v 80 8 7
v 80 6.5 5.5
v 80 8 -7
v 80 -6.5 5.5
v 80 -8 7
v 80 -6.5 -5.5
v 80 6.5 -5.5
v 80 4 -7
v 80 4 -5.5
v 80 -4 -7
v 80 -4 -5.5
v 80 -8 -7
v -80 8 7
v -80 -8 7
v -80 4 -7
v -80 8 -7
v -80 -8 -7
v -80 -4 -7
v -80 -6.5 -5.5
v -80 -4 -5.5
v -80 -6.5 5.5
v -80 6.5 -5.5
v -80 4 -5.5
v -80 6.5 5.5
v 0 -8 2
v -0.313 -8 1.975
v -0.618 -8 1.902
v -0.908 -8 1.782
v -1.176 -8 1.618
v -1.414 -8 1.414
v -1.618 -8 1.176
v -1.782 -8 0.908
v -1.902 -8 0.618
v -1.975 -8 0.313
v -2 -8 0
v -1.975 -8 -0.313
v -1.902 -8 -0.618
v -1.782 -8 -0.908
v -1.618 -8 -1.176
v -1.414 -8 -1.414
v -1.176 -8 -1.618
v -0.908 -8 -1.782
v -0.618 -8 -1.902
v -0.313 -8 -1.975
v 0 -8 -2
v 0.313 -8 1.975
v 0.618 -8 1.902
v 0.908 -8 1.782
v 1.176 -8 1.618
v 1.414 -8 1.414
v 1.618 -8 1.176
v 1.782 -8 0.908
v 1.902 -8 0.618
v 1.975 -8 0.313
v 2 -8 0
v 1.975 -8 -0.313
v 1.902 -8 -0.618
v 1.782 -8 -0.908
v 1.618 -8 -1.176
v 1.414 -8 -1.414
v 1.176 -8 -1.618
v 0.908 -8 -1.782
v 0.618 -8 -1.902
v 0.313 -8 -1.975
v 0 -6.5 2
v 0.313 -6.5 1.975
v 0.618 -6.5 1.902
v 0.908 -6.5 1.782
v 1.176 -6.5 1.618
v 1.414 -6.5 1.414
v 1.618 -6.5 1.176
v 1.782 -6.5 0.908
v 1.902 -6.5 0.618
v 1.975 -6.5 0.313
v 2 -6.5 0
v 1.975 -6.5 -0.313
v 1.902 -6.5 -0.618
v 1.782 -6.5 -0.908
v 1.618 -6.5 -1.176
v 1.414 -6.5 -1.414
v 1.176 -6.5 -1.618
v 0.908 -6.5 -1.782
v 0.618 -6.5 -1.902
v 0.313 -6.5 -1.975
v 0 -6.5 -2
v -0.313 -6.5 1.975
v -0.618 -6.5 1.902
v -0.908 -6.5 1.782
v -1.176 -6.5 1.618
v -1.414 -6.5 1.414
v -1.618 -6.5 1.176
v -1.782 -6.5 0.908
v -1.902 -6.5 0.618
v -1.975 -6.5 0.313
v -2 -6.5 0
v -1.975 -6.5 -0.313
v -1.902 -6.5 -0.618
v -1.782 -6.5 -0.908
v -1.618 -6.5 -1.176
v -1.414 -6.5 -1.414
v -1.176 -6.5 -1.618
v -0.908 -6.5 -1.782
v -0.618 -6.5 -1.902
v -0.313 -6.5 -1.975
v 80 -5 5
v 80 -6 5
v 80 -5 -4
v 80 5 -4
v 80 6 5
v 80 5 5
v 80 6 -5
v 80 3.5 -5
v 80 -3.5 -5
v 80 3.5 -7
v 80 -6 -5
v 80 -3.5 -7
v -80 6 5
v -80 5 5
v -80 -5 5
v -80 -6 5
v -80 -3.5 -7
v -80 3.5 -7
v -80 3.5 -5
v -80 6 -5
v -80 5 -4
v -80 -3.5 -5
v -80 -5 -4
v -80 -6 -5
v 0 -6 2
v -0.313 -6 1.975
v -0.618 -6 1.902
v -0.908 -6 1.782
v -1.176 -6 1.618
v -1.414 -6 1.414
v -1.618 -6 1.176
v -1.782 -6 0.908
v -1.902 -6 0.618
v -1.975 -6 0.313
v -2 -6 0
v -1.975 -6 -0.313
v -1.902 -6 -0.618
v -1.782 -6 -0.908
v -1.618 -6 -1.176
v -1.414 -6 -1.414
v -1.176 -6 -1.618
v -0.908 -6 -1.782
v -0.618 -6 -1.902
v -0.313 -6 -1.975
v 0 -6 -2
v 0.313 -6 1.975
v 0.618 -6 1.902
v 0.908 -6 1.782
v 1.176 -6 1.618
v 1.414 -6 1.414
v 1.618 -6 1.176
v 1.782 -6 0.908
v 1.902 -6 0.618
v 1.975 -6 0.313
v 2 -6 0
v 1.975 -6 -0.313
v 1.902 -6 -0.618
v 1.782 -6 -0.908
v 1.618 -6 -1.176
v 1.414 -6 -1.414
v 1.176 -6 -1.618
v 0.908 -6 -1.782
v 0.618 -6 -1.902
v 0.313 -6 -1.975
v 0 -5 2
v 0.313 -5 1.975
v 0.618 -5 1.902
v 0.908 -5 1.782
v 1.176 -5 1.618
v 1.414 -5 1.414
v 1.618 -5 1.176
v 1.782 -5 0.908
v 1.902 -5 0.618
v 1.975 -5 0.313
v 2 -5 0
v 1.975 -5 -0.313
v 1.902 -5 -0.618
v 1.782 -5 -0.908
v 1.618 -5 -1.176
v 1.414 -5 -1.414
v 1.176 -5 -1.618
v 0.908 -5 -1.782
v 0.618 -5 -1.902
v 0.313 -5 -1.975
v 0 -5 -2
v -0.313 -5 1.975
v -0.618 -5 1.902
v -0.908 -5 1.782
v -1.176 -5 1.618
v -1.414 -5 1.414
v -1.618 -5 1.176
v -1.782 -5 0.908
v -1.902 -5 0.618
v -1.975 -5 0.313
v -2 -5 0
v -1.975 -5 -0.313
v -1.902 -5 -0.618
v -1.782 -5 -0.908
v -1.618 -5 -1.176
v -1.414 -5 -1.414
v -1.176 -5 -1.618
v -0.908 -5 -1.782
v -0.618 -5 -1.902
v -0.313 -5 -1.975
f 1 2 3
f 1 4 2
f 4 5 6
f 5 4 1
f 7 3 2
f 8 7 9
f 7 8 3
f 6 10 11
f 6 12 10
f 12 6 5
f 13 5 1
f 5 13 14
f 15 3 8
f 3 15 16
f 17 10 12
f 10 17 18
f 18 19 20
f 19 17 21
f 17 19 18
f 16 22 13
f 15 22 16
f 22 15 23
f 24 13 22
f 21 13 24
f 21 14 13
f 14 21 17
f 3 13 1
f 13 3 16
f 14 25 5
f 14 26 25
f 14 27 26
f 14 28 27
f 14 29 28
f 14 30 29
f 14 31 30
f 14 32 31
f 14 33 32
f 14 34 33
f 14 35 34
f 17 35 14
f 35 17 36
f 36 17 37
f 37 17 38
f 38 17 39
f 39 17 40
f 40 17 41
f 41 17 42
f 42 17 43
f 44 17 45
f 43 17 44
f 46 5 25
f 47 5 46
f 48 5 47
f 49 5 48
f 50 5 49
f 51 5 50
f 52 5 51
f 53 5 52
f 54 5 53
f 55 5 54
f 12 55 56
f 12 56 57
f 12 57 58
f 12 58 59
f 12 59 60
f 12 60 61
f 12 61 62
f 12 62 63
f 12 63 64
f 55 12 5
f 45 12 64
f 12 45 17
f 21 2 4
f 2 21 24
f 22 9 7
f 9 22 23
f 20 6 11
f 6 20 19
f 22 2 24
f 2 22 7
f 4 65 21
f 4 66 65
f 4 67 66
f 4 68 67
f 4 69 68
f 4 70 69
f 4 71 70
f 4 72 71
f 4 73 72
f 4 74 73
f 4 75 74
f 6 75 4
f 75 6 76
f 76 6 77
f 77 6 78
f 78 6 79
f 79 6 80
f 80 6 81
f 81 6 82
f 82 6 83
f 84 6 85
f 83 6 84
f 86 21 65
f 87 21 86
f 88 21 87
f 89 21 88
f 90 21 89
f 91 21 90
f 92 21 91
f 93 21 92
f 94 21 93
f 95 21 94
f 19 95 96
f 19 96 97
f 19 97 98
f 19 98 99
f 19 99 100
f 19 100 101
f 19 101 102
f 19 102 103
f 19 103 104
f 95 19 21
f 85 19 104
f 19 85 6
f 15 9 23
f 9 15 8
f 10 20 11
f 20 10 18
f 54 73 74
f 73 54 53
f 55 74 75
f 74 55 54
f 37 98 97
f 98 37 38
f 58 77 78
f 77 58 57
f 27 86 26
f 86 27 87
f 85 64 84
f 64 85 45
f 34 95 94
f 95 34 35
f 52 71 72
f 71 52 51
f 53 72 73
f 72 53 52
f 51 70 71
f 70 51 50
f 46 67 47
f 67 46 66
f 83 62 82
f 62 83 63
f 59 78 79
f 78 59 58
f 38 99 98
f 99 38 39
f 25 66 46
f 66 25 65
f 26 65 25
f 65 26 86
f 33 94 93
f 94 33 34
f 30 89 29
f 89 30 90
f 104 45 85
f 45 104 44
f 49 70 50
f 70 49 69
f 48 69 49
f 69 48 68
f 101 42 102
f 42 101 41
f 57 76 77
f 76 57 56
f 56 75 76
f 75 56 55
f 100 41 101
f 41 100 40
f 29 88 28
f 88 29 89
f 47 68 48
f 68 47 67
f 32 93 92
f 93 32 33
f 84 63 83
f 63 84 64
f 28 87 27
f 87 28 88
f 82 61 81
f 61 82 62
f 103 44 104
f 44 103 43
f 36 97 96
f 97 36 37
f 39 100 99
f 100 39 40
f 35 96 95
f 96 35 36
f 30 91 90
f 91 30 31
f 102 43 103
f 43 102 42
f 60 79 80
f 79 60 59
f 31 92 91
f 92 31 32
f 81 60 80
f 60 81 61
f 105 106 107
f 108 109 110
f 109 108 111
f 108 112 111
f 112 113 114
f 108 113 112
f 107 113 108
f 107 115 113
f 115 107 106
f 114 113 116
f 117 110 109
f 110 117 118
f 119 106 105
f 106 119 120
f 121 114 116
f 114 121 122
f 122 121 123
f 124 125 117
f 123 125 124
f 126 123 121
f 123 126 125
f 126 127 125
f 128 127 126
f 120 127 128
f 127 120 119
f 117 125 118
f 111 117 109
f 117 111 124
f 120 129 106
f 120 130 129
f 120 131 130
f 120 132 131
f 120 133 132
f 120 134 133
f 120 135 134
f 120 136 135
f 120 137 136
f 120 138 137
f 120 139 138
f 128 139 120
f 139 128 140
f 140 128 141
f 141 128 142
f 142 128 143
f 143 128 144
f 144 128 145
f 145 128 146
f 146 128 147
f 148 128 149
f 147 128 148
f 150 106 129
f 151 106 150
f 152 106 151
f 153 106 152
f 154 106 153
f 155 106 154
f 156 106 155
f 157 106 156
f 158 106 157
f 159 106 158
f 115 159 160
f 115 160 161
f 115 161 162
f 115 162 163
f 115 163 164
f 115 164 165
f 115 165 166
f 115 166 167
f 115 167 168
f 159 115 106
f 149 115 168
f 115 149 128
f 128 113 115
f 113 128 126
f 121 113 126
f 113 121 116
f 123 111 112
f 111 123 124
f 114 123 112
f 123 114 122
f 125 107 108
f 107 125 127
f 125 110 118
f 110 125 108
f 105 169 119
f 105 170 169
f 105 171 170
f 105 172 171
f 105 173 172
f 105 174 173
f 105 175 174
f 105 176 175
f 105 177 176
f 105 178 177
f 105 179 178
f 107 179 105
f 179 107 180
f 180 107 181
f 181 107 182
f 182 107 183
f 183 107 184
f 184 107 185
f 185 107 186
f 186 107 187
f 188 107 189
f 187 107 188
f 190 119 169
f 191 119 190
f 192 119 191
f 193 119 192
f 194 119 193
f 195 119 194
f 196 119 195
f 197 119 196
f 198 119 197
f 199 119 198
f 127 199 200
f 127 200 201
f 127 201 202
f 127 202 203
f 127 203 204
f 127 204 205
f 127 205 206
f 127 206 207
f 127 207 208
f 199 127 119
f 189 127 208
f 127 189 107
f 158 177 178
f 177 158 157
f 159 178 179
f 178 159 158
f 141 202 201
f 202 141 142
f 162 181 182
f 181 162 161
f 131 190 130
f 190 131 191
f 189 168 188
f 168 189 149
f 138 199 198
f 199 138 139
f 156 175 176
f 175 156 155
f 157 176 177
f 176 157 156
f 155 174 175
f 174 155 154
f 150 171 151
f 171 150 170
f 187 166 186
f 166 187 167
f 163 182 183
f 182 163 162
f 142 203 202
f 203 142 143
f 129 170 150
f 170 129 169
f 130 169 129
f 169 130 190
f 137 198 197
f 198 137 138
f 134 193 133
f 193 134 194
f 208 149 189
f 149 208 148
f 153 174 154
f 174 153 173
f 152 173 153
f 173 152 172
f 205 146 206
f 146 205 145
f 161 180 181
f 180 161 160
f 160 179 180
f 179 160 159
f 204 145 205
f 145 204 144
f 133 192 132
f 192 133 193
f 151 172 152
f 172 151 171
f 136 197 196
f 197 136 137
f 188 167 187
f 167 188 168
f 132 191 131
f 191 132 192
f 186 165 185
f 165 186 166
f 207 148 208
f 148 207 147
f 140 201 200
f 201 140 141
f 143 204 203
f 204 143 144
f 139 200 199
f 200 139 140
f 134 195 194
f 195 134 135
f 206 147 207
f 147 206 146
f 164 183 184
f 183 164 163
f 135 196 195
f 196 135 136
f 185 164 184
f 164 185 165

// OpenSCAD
// Power LED Gehäuse

Oben = true;
Unten = true;


if (Oben) Oben();
if (Unten) color("Lightblue") Unten();
    


module Oben()
{ 
    difference()
    {
        cube([160,16,14],center=true);
        translate([0,0,0])
        cube([162,13,11],center=true);
        translate([0,0,-6])
        cube([162,8,4],center=true);
        rotate([90,0,0])
        translate([0,0,5])
        cylinder(d=4,h=10,center=true, $fn=40);
    }
}

module Unten()
{ 
    difference()
    {
        translate([0,0,-1])
        cube([160,12,12],center=true);
        translate([0,-5,-6.5])
        cube([162,3,3],center=true);
        translate([0,5,-6.5])
        cube([162,3,3],center=true);
        translate([0,0,1])
        cube([162,10,10],center=true);
    
        rotate([90,0,0])
        translate([0,0,5])
        cylinder(d=4,h=10,center=true, $fn=40);
    }
}
